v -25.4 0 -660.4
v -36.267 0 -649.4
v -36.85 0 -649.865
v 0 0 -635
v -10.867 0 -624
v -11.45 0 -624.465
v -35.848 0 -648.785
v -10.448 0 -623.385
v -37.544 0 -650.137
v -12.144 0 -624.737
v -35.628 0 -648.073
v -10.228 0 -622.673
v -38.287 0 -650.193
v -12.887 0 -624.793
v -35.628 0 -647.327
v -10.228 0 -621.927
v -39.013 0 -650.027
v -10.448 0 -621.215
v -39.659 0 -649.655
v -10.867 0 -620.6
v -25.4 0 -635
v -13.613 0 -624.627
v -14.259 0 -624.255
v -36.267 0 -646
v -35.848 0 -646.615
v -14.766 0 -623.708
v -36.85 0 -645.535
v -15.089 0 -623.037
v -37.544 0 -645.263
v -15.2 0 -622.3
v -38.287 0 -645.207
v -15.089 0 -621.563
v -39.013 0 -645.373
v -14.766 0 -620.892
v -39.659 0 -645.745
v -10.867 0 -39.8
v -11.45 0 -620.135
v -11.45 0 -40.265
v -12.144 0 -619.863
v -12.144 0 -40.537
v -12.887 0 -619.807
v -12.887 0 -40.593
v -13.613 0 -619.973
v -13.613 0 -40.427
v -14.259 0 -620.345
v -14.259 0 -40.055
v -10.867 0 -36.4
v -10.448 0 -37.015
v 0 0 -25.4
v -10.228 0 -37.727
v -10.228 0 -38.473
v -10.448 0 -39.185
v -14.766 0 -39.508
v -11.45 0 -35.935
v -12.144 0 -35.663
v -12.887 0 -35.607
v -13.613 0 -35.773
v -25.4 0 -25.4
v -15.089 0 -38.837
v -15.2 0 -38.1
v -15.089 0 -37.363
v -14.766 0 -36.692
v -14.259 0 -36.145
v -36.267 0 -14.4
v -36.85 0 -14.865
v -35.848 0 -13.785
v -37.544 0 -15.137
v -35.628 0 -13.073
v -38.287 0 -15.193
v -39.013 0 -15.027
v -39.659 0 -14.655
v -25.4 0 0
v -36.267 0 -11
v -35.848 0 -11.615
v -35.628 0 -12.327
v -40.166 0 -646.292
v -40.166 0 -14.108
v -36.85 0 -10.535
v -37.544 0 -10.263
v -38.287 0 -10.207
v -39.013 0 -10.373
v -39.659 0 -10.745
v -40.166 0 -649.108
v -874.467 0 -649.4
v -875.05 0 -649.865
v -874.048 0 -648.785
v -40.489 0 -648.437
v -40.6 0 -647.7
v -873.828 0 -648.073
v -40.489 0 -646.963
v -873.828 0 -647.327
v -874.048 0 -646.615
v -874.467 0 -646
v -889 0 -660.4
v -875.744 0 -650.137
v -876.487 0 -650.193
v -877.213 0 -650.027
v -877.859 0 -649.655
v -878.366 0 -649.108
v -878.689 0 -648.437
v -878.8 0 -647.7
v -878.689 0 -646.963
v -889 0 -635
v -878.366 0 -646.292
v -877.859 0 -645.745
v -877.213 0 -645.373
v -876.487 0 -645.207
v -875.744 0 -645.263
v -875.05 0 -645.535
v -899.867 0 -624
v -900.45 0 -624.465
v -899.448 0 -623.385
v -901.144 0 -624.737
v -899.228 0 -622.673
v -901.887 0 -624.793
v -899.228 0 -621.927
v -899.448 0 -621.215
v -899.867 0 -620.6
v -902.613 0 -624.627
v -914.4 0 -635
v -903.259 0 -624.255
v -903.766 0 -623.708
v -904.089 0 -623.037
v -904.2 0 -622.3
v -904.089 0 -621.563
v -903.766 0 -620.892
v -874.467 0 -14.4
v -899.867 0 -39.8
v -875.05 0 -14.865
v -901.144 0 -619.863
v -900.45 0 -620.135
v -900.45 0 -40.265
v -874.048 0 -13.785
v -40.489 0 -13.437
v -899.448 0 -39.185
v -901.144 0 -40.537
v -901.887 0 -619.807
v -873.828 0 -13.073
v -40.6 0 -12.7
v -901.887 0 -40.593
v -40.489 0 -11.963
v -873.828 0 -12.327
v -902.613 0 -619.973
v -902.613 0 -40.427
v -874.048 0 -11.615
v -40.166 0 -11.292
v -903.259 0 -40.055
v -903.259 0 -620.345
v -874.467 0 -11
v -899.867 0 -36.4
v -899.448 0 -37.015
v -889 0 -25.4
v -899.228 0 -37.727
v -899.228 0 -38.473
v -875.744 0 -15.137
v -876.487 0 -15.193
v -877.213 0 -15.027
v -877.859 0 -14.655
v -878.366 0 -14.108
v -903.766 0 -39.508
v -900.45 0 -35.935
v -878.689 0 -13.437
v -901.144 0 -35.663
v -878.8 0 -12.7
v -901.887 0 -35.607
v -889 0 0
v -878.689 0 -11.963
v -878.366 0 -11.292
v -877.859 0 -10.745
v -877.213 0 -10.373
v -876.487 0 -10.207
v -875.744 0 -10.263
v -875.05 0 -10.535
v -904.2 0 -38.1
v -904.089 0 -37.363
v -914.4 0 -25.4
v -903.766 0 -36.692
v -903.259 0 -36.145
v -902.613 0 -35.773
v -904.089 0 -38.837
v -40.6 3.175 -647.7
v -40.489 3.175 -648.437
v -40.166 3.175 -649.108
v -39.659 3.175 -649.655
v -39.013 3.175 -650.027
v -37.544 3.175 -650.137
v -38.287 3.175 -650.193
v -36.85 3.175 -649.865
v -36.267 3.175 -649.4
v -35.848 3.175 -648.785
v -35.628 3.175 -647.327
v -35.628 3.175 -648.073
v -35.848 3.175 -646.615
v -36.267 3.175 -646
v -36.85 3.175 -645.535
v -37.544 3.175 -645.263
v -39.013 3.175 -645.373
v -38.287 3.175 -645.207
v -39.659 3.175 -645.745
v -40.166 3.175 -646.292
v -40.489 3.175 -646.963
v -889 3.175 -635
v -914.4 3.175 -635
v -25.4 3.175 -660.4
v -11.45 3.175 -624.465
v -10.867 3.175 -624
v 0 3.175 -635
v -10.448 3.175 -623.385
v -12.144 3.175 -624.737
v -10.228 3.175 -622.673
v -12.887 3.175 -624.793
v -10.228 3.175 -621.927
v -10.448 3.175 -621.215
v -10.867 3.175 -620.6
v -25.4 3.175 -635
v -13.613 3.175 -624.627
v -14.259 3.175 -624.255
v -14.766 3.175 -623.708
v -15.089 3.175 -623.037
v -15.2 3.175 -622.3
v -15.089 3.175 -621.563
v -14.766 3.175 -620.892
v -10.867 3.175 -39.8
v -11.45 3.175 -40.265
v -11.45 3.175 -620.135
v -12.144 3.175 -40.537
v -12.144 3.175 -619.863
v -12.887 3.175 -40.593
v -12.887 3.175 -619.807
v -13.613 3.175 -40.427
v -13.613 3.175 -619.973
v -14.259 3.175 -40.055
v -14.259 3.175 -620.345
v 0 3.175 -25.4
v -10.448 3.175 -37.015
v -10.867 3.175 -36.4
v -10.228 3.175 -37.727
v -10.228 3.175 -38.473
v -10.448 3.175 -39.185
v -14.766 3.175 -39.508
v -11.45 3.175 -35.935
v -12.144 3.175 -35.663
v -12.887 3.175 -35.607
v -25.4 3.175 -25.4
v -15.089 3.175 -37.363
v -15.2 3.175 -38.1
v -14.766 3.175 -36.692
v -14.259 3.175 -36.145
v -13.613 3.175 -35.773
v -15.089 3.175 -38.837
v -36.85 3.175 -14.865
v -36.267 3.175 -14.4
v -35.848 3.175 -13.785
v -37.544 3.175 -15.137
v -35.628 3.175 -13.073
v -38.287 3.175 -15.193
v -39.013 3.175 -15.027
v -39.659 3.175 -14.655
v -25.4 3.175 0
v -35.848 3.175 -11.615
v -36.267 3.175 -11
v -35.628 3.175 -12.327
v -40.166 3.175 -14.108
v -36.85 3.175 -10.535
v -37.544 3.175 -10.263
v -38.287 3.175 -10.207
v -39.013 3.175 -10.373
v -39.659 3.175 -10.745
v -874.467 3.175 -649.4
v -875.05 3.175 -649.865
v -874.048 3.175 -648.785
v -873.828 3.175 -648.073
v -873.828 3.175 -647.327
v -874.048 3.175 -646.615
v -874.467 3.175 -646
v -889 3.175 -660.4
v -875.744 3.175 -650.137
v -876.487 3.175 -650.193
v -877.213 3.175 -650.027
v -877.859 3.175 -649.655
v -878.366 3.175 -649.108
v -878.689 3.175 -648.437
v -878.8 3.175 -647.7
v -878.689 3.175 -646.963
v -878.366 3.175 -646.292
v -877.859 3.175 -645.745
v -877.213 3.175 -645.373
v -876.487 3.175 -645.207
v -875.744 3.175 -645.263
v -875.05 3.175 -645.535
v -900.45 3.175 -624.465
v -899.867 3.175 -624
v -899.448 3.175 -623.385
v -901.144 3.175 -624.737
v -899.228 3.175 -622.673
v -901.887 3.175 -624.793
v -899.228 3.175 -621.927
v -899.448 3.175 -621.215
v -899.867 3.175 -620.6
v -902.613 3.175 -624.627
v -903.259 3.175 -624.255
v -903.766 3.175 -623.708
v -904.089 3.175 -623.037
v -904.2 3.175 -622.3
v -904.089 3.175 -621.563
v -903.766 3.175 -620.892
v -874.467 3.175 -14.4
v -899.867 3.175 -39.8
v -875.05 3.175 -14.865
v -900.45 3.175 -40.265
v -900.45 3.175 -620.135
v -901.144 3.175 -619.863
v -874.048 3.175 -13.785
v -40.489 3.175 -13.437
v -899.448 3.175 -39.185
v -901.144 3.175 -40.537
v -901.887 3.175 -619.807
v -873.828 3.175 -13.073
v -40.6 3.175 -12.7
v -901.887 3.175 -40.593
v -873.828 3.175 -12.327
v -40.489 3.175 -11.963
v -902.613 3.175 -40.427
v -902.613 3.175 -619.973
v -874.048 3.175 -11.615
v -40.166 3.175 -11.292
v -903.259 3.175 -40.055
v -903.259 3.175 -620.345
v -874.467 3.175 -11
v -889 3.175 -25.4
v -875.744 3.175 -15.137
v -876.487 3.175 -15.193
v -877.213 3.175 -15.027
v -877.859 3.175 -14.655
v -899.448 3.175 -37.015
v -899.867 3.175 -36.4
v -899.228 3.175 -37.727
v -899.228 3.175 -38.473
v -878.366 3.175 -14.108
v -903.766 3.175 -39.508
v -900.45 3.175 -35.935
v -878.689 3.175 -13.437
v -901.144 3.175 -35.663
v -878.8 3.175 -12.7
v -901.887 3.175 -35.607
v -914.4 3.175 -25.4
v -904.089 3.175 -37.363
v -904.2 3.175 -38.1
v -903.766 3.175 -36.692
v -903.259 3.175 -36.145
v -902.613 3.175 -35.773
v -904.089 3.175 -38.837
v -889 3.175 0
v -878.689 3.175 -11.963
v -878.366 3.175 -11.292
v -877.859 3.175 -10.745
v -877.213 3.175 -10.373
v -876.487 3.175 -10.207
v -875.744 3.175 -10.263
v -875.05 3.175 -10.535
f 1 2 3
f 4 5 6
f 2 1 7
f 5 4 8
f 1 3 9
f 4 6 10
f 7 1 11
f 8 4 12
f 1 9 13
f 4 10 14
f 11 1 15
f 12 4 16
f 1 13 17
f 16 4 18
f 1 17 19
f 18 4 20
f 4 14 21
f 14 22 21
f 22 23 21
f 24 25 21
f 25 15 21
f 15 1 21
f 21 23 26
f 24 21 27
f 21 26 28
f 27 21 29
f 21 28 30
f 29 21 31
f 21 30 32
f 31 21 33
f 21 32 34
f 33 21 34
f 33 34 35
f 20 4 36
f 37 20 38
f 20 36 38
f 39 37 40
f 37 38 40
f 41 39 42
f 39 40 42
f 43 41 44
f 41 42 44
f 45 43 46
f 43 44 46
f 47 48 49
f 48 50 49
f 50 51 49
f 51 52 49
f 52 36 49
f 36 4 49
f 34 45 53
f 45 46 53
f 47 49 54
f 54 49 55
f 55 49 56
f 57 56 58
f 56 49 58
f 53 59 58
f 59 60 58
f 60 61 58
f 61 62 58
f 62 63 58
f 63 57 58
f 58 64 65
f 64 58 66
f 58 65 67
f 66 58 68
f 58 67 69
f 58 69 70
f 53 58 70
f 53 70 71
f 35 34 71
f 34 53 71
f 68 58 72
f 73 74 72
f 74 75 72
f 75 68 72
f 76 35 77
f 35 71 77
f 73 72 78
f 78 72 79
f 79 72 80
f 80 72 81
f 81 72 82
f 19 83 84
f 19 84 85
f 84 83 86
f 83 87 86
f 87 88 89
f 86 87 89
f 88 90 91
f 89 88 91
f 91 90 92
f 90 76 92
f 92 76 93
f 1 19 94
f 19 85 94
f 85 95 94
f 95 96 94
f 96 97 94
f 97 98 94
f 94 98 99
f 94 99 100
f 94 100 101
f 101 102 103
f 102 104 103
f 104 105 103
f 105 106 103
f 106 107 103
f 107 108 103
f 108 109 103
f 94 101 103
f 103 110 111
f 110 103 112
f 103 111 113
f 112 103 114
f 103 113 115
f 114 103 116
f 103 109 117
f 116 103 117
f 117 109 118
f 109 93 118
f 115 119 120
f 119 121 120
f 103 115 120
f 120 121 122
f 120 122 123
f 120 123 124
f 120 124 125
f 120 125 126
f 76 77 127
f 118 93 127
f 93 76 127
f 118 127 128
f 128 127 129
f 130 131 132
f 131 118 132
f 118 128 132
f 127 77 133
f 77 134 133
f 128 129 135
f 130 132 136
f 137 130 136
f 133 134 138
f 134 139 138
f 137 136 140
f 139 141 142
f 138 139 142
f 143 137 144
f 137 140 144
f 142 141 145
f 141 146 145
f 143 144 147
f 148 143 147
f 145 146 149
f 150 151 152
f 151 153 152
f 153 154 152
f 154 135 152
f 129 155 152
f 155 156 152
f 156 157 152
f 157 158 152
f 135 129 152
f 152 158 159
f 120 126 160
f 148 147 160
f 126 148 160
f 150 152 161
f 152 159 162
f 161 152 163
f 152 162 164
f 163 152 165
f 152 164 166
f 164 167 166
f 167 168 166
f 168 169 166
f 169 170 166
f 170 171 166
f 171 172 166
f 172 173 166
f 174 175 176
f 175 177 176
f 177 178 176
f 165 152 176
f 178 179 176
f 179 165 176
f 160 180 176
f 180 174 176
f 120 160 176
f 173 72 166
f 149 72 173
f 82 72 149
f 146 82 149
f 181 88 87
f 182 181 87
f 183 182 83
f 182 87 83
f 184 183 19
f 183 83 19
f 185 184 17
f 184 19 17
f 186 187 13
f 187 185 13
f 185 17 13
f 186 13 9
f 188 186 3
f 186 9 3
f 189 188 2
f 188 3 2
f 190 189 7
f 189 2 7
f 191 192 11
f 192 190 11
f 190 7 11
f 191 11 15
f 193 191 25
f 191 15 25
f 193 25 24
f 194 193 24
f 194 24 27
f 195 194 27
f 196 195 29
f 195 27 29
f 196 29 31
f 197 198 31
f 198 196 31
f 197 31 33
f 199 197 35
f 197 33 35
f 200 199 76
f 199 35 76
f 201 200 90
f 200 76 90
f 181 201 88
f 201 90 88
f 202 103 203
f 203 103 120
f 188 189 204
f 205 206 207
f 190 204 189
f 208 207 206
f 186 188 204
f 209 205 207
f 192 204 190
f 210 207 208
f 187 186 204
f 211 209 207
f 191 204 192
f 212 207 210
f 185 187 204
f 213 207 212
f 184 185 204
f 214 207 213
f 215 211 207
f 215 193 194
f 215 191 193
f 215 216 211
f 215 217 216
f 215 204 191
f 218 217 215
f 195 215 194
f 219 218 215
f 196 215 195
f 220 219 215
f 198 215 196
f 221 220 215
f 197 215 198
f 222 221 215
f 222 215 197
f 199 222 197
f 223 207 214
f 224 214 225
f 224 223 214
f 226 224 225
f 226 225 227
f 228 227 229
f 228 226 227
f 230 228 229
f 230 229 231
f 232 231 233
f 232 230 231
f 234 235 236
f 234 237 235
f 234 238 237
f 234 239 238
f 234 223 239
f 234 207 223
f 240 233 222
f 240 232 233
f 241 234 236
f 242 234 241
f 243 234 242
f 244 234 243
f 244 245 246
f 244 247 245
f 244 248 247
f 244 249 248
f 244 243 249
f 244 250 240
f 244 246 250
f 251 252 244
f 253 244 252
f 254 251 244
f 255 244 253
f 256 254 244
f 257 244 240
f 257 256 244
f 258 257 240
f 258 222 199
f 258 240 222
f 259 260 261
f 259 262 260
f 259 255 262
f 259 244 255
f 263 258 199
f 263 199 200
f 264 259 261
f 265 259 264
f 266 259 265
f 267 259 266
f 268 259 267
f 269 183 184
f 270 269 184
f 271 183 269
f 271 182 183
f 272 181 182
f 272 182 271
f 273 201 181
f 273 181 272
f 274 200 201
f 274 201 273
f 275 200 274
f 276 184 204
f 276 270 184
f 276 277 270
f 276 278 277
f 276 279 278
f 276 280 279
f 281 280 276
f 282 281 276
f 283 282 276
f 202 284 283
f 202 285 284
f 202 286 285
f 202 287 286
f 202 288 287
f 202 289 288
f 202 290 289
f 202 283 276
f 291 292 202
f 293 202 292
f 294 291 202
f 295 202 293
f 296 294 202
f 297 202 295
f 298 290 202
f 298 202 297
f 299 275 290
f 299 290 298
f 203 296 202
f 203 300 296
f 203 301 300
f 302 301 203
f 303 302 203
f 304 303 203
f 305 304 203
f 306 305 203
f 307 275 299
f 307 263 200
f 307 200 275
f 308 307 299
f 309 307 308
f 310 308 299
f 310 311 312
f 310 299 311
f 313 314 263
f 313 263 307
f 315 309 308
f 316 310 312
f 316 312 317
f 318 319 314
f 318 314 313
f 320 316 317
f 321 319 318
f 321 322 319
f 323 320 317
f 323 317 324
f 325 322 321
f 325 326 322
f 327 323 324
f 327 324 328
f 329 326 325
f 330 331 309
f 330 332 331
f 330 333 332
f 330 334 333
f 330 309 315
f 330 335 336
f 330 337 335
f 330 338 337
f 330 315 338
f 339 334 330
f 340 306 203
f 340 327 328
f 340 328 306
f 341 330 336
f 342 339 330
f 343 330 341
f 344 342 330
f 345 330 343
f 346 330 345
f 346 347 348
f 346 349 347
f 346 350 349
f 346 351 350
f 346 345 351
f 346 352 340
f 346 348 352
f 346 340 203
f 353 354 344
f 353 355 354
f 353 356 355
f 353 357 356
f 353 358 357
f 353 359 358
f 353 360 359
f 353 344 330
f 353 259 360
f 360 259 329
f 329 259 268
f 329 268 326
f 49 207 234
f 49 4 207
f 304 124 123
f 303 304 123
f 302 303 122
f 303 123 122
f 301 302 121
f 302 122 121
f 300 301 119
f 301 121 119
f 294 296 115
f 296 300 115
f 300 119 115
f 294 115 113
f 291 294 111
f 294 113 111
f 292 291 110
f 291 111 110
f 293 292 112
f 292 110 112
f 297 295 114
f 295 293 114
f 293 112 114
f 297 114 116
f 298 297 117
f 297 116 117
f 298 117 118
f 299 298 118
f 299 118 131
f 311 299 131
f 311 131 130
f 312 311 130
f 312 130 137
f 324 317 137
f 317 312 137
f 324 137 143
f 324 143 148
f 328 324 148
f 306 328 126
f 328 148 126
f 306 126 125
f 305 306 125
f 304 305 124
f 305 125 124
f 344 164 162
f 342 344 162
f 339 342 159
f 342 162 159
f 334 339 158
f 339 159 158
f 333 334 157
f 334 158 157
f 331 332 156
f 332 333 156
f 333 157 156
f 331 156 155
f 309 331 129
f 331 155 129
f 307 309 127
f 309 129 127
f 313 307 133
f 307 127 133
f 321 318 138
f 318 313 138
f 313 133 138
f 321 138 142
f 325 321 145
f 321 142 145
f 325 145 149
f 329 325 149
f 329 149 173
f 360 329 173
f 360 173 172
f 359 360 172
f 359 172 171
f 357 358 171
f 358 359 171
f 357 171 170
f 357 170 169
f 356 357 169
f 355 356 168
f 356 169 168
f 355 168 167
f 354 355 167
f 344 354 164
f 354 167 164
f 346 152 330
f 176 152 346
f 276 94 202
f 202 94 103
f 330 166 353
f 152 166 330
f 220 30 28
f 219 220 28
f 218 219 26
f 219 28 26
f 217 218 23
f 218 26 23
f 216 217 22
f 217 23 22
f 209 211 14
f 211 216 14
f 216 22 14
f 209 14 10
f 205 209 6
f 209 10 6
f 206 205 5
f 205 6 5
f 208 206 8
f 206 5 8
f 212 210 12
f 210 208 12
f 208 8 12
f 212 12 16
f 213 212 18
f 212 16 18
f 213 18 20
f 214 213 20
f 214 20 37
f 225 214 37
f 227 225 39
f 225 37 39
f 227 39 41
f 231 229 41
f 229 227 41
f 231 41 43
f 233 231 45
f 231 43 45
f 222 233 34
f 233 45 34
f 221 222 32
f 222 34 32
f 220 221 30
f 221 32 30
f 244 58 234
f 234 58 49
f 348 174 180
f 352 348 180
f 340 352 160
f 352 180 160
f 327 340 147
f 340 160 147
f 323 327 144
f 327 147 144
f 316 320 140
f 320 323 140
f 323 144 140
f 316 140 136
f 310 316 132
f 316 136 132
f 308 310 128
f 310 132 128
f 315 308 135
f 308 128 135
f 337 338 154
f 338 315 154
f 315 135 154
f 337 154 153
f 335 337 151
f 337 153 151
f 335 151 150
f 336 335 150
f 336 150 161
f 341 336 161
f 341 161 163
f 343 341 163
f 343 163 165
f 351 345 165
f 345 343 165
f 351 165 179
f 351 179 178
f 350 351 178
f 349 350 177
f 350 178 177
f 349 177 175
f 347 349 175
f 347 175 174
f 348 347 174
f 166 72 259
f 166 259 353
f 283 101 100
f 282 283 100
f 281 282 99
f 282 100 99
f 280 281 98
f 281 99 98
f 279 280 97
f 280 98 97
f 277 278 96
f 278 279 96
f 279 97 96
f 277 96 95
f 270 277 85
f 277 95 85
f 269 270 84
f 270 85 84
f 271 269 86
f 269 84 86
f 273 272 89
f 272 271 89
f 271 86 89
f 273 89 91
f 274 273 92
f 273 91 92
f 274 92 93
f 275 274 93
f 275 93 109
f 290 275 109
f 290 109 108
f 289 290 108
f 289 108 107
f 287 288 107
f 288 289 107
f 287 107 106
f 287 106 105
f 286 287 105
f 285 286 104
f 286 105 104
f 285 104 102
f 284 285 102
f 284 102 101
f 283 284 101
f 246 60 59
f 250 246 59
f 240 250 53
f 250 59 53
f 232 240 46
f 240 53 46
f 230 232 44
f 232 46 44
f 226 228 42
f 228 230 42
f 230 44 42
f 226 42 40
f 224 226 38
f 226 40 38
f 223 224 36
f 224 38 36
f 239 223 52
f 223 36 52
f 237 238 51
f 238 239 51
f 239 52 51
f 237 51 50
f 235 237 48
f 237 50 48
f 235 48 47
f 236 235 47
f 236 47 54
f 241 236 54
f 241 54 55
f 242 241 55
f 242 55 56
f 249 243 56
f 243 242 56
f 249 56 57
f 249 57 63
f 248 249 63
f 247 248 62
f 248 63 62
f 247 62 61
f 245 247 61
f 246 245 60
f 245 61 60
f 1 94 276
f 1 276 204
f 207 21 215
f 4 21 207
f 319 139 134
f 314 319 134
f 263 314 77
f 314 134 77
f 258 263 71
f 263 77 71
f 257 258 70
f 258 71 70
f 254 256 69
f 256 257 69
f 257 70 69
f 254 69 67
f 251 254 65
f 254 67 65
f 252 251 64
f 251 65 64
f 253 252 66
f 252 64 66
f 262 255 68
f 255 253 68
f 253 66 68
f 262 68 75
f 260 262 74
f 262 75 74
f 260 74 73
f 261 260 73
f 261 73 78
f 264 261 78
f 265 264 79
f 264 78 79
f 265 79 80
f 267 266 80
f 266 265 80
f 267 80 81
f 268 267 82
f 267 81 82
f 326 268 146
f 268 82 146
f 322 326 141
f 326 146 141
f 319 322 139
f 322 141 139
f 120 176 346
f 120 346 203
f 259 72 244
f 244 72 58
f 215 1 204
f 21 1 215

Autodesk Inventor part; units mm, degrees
ref_plane "YZ Plane" through (0, 0, 0) normal (1, 0, 0) x (0, 1, 0)
ref_plane "XZ Plane" through (0, 0, 0) normal (0, 1, 0) x (-1, 0, 0)
ref_plane "XY Plane" through (0, 0, 0) normal (0, 0, 1) x (1, 0, 0)
sketch "Sketch1" plane through (0, 0, 0) normal (0, 1, 0) x (-1, 0, 0)
  line L0 (0, 0) -> (914.4, 0)
  line L1 (914.4, 0) -> (914.4, -660.4)
  line L2 (914.4, -660.4) -> (0, -660.4)
  line L3 (0, -660.4) -> (0, 0)
  line L4 (914.4, 0) -> (889, 0)
  line L5 (889, 0) -> (889, -25.4)
  line L6 (889, -25.4) -> (914.4, -25.4)
  line L7 (914.4, -25.4) -> (914.4, 0)
  line L8 (914.4, -660.4) -> (889, -660.4)
  line L9 (889, -660.4) -> (889, -635)
  line L10 (889, -635) -> (914.4, -635)
  line L11 (914.4, -635) -> (914.4, -660.4)
  line L12 (0, -660.4) -> (25.4, -660.4)
  line L13 (25.4, -660.4) -> (25.4, -635)
  line L14 (25.4, -635) -> (0, -635)
  line L15 (0, -635) -> (0, -660.4)
  line L16 (0, 0) -> (25.4, 0)
  line L17 (25.4, 0) -> (25.4, -25.4)
  line L18 (25.4, -25.4) -> (0, -25.4)
  line L19 (0, -25.4) -> (0, 0)
  circle A0 centre (901.7, -38.1) radius 2.5
  circle A1 centre (876.3, -12.7) radius 2.5
  circle A2 centre (901.7, -622.3) radius 2.5
  circle A3 centre (876.3, -647.7) radius 2.5
  circle A4 centre (12.7, -38.1) radius 2.5
  circle A5 centre (38.1, -12.7) radius 2.5
  circle A6 centre (12.7, -622.3) radius 2.5
  circle A7 centre (38.1, -647.7) radius 2.5
  point P0 (889, -647.7)
  point P1 (0, -635)
  dimension "d0" = 914.4
  dimension "d1" = 660.4
  dimension "d2" = 25.4
  dimension "d3" = 25.4
  dimension "d4" = 25.4
  dimension "d5" = 25.4
  dimension "d6" = 25.4
  dimension "d7" = 25.4
  dimension "d8" = 25.4
  dimension "d9" = 25.4
  dimension "d10" = 5
  dimension "d11" = 12.7
  dimension "d12" = 12.7
  dimension "d13" = 5
  dimension "d14" = 12.7
  dimension "d15" = 12.7
  dimension "d16" = 5
  dimension "d17" = 5
  dimension "d18" = 12.7
  dimension "d19" = 12.7
  dimension "d20" = 12.7
  dimension "d21" = 12.7
extrude "Extrusion1" add sketch "Sketch1" along normal blind 3.175 contours L0 L5 L6 L1 L10 L9 L2 L13 L14 L3 L18 L17
equation "\"d14\" = d12"
equation "\"d15\" = d11"
equation "\"d18\" = d14"
equation "\"d19\" = d14"
equation "\"d20\" = d19"
equation "\"d21\" = d18"
properties part number "Electronics Board" material "Polycarbonate, Clear"
